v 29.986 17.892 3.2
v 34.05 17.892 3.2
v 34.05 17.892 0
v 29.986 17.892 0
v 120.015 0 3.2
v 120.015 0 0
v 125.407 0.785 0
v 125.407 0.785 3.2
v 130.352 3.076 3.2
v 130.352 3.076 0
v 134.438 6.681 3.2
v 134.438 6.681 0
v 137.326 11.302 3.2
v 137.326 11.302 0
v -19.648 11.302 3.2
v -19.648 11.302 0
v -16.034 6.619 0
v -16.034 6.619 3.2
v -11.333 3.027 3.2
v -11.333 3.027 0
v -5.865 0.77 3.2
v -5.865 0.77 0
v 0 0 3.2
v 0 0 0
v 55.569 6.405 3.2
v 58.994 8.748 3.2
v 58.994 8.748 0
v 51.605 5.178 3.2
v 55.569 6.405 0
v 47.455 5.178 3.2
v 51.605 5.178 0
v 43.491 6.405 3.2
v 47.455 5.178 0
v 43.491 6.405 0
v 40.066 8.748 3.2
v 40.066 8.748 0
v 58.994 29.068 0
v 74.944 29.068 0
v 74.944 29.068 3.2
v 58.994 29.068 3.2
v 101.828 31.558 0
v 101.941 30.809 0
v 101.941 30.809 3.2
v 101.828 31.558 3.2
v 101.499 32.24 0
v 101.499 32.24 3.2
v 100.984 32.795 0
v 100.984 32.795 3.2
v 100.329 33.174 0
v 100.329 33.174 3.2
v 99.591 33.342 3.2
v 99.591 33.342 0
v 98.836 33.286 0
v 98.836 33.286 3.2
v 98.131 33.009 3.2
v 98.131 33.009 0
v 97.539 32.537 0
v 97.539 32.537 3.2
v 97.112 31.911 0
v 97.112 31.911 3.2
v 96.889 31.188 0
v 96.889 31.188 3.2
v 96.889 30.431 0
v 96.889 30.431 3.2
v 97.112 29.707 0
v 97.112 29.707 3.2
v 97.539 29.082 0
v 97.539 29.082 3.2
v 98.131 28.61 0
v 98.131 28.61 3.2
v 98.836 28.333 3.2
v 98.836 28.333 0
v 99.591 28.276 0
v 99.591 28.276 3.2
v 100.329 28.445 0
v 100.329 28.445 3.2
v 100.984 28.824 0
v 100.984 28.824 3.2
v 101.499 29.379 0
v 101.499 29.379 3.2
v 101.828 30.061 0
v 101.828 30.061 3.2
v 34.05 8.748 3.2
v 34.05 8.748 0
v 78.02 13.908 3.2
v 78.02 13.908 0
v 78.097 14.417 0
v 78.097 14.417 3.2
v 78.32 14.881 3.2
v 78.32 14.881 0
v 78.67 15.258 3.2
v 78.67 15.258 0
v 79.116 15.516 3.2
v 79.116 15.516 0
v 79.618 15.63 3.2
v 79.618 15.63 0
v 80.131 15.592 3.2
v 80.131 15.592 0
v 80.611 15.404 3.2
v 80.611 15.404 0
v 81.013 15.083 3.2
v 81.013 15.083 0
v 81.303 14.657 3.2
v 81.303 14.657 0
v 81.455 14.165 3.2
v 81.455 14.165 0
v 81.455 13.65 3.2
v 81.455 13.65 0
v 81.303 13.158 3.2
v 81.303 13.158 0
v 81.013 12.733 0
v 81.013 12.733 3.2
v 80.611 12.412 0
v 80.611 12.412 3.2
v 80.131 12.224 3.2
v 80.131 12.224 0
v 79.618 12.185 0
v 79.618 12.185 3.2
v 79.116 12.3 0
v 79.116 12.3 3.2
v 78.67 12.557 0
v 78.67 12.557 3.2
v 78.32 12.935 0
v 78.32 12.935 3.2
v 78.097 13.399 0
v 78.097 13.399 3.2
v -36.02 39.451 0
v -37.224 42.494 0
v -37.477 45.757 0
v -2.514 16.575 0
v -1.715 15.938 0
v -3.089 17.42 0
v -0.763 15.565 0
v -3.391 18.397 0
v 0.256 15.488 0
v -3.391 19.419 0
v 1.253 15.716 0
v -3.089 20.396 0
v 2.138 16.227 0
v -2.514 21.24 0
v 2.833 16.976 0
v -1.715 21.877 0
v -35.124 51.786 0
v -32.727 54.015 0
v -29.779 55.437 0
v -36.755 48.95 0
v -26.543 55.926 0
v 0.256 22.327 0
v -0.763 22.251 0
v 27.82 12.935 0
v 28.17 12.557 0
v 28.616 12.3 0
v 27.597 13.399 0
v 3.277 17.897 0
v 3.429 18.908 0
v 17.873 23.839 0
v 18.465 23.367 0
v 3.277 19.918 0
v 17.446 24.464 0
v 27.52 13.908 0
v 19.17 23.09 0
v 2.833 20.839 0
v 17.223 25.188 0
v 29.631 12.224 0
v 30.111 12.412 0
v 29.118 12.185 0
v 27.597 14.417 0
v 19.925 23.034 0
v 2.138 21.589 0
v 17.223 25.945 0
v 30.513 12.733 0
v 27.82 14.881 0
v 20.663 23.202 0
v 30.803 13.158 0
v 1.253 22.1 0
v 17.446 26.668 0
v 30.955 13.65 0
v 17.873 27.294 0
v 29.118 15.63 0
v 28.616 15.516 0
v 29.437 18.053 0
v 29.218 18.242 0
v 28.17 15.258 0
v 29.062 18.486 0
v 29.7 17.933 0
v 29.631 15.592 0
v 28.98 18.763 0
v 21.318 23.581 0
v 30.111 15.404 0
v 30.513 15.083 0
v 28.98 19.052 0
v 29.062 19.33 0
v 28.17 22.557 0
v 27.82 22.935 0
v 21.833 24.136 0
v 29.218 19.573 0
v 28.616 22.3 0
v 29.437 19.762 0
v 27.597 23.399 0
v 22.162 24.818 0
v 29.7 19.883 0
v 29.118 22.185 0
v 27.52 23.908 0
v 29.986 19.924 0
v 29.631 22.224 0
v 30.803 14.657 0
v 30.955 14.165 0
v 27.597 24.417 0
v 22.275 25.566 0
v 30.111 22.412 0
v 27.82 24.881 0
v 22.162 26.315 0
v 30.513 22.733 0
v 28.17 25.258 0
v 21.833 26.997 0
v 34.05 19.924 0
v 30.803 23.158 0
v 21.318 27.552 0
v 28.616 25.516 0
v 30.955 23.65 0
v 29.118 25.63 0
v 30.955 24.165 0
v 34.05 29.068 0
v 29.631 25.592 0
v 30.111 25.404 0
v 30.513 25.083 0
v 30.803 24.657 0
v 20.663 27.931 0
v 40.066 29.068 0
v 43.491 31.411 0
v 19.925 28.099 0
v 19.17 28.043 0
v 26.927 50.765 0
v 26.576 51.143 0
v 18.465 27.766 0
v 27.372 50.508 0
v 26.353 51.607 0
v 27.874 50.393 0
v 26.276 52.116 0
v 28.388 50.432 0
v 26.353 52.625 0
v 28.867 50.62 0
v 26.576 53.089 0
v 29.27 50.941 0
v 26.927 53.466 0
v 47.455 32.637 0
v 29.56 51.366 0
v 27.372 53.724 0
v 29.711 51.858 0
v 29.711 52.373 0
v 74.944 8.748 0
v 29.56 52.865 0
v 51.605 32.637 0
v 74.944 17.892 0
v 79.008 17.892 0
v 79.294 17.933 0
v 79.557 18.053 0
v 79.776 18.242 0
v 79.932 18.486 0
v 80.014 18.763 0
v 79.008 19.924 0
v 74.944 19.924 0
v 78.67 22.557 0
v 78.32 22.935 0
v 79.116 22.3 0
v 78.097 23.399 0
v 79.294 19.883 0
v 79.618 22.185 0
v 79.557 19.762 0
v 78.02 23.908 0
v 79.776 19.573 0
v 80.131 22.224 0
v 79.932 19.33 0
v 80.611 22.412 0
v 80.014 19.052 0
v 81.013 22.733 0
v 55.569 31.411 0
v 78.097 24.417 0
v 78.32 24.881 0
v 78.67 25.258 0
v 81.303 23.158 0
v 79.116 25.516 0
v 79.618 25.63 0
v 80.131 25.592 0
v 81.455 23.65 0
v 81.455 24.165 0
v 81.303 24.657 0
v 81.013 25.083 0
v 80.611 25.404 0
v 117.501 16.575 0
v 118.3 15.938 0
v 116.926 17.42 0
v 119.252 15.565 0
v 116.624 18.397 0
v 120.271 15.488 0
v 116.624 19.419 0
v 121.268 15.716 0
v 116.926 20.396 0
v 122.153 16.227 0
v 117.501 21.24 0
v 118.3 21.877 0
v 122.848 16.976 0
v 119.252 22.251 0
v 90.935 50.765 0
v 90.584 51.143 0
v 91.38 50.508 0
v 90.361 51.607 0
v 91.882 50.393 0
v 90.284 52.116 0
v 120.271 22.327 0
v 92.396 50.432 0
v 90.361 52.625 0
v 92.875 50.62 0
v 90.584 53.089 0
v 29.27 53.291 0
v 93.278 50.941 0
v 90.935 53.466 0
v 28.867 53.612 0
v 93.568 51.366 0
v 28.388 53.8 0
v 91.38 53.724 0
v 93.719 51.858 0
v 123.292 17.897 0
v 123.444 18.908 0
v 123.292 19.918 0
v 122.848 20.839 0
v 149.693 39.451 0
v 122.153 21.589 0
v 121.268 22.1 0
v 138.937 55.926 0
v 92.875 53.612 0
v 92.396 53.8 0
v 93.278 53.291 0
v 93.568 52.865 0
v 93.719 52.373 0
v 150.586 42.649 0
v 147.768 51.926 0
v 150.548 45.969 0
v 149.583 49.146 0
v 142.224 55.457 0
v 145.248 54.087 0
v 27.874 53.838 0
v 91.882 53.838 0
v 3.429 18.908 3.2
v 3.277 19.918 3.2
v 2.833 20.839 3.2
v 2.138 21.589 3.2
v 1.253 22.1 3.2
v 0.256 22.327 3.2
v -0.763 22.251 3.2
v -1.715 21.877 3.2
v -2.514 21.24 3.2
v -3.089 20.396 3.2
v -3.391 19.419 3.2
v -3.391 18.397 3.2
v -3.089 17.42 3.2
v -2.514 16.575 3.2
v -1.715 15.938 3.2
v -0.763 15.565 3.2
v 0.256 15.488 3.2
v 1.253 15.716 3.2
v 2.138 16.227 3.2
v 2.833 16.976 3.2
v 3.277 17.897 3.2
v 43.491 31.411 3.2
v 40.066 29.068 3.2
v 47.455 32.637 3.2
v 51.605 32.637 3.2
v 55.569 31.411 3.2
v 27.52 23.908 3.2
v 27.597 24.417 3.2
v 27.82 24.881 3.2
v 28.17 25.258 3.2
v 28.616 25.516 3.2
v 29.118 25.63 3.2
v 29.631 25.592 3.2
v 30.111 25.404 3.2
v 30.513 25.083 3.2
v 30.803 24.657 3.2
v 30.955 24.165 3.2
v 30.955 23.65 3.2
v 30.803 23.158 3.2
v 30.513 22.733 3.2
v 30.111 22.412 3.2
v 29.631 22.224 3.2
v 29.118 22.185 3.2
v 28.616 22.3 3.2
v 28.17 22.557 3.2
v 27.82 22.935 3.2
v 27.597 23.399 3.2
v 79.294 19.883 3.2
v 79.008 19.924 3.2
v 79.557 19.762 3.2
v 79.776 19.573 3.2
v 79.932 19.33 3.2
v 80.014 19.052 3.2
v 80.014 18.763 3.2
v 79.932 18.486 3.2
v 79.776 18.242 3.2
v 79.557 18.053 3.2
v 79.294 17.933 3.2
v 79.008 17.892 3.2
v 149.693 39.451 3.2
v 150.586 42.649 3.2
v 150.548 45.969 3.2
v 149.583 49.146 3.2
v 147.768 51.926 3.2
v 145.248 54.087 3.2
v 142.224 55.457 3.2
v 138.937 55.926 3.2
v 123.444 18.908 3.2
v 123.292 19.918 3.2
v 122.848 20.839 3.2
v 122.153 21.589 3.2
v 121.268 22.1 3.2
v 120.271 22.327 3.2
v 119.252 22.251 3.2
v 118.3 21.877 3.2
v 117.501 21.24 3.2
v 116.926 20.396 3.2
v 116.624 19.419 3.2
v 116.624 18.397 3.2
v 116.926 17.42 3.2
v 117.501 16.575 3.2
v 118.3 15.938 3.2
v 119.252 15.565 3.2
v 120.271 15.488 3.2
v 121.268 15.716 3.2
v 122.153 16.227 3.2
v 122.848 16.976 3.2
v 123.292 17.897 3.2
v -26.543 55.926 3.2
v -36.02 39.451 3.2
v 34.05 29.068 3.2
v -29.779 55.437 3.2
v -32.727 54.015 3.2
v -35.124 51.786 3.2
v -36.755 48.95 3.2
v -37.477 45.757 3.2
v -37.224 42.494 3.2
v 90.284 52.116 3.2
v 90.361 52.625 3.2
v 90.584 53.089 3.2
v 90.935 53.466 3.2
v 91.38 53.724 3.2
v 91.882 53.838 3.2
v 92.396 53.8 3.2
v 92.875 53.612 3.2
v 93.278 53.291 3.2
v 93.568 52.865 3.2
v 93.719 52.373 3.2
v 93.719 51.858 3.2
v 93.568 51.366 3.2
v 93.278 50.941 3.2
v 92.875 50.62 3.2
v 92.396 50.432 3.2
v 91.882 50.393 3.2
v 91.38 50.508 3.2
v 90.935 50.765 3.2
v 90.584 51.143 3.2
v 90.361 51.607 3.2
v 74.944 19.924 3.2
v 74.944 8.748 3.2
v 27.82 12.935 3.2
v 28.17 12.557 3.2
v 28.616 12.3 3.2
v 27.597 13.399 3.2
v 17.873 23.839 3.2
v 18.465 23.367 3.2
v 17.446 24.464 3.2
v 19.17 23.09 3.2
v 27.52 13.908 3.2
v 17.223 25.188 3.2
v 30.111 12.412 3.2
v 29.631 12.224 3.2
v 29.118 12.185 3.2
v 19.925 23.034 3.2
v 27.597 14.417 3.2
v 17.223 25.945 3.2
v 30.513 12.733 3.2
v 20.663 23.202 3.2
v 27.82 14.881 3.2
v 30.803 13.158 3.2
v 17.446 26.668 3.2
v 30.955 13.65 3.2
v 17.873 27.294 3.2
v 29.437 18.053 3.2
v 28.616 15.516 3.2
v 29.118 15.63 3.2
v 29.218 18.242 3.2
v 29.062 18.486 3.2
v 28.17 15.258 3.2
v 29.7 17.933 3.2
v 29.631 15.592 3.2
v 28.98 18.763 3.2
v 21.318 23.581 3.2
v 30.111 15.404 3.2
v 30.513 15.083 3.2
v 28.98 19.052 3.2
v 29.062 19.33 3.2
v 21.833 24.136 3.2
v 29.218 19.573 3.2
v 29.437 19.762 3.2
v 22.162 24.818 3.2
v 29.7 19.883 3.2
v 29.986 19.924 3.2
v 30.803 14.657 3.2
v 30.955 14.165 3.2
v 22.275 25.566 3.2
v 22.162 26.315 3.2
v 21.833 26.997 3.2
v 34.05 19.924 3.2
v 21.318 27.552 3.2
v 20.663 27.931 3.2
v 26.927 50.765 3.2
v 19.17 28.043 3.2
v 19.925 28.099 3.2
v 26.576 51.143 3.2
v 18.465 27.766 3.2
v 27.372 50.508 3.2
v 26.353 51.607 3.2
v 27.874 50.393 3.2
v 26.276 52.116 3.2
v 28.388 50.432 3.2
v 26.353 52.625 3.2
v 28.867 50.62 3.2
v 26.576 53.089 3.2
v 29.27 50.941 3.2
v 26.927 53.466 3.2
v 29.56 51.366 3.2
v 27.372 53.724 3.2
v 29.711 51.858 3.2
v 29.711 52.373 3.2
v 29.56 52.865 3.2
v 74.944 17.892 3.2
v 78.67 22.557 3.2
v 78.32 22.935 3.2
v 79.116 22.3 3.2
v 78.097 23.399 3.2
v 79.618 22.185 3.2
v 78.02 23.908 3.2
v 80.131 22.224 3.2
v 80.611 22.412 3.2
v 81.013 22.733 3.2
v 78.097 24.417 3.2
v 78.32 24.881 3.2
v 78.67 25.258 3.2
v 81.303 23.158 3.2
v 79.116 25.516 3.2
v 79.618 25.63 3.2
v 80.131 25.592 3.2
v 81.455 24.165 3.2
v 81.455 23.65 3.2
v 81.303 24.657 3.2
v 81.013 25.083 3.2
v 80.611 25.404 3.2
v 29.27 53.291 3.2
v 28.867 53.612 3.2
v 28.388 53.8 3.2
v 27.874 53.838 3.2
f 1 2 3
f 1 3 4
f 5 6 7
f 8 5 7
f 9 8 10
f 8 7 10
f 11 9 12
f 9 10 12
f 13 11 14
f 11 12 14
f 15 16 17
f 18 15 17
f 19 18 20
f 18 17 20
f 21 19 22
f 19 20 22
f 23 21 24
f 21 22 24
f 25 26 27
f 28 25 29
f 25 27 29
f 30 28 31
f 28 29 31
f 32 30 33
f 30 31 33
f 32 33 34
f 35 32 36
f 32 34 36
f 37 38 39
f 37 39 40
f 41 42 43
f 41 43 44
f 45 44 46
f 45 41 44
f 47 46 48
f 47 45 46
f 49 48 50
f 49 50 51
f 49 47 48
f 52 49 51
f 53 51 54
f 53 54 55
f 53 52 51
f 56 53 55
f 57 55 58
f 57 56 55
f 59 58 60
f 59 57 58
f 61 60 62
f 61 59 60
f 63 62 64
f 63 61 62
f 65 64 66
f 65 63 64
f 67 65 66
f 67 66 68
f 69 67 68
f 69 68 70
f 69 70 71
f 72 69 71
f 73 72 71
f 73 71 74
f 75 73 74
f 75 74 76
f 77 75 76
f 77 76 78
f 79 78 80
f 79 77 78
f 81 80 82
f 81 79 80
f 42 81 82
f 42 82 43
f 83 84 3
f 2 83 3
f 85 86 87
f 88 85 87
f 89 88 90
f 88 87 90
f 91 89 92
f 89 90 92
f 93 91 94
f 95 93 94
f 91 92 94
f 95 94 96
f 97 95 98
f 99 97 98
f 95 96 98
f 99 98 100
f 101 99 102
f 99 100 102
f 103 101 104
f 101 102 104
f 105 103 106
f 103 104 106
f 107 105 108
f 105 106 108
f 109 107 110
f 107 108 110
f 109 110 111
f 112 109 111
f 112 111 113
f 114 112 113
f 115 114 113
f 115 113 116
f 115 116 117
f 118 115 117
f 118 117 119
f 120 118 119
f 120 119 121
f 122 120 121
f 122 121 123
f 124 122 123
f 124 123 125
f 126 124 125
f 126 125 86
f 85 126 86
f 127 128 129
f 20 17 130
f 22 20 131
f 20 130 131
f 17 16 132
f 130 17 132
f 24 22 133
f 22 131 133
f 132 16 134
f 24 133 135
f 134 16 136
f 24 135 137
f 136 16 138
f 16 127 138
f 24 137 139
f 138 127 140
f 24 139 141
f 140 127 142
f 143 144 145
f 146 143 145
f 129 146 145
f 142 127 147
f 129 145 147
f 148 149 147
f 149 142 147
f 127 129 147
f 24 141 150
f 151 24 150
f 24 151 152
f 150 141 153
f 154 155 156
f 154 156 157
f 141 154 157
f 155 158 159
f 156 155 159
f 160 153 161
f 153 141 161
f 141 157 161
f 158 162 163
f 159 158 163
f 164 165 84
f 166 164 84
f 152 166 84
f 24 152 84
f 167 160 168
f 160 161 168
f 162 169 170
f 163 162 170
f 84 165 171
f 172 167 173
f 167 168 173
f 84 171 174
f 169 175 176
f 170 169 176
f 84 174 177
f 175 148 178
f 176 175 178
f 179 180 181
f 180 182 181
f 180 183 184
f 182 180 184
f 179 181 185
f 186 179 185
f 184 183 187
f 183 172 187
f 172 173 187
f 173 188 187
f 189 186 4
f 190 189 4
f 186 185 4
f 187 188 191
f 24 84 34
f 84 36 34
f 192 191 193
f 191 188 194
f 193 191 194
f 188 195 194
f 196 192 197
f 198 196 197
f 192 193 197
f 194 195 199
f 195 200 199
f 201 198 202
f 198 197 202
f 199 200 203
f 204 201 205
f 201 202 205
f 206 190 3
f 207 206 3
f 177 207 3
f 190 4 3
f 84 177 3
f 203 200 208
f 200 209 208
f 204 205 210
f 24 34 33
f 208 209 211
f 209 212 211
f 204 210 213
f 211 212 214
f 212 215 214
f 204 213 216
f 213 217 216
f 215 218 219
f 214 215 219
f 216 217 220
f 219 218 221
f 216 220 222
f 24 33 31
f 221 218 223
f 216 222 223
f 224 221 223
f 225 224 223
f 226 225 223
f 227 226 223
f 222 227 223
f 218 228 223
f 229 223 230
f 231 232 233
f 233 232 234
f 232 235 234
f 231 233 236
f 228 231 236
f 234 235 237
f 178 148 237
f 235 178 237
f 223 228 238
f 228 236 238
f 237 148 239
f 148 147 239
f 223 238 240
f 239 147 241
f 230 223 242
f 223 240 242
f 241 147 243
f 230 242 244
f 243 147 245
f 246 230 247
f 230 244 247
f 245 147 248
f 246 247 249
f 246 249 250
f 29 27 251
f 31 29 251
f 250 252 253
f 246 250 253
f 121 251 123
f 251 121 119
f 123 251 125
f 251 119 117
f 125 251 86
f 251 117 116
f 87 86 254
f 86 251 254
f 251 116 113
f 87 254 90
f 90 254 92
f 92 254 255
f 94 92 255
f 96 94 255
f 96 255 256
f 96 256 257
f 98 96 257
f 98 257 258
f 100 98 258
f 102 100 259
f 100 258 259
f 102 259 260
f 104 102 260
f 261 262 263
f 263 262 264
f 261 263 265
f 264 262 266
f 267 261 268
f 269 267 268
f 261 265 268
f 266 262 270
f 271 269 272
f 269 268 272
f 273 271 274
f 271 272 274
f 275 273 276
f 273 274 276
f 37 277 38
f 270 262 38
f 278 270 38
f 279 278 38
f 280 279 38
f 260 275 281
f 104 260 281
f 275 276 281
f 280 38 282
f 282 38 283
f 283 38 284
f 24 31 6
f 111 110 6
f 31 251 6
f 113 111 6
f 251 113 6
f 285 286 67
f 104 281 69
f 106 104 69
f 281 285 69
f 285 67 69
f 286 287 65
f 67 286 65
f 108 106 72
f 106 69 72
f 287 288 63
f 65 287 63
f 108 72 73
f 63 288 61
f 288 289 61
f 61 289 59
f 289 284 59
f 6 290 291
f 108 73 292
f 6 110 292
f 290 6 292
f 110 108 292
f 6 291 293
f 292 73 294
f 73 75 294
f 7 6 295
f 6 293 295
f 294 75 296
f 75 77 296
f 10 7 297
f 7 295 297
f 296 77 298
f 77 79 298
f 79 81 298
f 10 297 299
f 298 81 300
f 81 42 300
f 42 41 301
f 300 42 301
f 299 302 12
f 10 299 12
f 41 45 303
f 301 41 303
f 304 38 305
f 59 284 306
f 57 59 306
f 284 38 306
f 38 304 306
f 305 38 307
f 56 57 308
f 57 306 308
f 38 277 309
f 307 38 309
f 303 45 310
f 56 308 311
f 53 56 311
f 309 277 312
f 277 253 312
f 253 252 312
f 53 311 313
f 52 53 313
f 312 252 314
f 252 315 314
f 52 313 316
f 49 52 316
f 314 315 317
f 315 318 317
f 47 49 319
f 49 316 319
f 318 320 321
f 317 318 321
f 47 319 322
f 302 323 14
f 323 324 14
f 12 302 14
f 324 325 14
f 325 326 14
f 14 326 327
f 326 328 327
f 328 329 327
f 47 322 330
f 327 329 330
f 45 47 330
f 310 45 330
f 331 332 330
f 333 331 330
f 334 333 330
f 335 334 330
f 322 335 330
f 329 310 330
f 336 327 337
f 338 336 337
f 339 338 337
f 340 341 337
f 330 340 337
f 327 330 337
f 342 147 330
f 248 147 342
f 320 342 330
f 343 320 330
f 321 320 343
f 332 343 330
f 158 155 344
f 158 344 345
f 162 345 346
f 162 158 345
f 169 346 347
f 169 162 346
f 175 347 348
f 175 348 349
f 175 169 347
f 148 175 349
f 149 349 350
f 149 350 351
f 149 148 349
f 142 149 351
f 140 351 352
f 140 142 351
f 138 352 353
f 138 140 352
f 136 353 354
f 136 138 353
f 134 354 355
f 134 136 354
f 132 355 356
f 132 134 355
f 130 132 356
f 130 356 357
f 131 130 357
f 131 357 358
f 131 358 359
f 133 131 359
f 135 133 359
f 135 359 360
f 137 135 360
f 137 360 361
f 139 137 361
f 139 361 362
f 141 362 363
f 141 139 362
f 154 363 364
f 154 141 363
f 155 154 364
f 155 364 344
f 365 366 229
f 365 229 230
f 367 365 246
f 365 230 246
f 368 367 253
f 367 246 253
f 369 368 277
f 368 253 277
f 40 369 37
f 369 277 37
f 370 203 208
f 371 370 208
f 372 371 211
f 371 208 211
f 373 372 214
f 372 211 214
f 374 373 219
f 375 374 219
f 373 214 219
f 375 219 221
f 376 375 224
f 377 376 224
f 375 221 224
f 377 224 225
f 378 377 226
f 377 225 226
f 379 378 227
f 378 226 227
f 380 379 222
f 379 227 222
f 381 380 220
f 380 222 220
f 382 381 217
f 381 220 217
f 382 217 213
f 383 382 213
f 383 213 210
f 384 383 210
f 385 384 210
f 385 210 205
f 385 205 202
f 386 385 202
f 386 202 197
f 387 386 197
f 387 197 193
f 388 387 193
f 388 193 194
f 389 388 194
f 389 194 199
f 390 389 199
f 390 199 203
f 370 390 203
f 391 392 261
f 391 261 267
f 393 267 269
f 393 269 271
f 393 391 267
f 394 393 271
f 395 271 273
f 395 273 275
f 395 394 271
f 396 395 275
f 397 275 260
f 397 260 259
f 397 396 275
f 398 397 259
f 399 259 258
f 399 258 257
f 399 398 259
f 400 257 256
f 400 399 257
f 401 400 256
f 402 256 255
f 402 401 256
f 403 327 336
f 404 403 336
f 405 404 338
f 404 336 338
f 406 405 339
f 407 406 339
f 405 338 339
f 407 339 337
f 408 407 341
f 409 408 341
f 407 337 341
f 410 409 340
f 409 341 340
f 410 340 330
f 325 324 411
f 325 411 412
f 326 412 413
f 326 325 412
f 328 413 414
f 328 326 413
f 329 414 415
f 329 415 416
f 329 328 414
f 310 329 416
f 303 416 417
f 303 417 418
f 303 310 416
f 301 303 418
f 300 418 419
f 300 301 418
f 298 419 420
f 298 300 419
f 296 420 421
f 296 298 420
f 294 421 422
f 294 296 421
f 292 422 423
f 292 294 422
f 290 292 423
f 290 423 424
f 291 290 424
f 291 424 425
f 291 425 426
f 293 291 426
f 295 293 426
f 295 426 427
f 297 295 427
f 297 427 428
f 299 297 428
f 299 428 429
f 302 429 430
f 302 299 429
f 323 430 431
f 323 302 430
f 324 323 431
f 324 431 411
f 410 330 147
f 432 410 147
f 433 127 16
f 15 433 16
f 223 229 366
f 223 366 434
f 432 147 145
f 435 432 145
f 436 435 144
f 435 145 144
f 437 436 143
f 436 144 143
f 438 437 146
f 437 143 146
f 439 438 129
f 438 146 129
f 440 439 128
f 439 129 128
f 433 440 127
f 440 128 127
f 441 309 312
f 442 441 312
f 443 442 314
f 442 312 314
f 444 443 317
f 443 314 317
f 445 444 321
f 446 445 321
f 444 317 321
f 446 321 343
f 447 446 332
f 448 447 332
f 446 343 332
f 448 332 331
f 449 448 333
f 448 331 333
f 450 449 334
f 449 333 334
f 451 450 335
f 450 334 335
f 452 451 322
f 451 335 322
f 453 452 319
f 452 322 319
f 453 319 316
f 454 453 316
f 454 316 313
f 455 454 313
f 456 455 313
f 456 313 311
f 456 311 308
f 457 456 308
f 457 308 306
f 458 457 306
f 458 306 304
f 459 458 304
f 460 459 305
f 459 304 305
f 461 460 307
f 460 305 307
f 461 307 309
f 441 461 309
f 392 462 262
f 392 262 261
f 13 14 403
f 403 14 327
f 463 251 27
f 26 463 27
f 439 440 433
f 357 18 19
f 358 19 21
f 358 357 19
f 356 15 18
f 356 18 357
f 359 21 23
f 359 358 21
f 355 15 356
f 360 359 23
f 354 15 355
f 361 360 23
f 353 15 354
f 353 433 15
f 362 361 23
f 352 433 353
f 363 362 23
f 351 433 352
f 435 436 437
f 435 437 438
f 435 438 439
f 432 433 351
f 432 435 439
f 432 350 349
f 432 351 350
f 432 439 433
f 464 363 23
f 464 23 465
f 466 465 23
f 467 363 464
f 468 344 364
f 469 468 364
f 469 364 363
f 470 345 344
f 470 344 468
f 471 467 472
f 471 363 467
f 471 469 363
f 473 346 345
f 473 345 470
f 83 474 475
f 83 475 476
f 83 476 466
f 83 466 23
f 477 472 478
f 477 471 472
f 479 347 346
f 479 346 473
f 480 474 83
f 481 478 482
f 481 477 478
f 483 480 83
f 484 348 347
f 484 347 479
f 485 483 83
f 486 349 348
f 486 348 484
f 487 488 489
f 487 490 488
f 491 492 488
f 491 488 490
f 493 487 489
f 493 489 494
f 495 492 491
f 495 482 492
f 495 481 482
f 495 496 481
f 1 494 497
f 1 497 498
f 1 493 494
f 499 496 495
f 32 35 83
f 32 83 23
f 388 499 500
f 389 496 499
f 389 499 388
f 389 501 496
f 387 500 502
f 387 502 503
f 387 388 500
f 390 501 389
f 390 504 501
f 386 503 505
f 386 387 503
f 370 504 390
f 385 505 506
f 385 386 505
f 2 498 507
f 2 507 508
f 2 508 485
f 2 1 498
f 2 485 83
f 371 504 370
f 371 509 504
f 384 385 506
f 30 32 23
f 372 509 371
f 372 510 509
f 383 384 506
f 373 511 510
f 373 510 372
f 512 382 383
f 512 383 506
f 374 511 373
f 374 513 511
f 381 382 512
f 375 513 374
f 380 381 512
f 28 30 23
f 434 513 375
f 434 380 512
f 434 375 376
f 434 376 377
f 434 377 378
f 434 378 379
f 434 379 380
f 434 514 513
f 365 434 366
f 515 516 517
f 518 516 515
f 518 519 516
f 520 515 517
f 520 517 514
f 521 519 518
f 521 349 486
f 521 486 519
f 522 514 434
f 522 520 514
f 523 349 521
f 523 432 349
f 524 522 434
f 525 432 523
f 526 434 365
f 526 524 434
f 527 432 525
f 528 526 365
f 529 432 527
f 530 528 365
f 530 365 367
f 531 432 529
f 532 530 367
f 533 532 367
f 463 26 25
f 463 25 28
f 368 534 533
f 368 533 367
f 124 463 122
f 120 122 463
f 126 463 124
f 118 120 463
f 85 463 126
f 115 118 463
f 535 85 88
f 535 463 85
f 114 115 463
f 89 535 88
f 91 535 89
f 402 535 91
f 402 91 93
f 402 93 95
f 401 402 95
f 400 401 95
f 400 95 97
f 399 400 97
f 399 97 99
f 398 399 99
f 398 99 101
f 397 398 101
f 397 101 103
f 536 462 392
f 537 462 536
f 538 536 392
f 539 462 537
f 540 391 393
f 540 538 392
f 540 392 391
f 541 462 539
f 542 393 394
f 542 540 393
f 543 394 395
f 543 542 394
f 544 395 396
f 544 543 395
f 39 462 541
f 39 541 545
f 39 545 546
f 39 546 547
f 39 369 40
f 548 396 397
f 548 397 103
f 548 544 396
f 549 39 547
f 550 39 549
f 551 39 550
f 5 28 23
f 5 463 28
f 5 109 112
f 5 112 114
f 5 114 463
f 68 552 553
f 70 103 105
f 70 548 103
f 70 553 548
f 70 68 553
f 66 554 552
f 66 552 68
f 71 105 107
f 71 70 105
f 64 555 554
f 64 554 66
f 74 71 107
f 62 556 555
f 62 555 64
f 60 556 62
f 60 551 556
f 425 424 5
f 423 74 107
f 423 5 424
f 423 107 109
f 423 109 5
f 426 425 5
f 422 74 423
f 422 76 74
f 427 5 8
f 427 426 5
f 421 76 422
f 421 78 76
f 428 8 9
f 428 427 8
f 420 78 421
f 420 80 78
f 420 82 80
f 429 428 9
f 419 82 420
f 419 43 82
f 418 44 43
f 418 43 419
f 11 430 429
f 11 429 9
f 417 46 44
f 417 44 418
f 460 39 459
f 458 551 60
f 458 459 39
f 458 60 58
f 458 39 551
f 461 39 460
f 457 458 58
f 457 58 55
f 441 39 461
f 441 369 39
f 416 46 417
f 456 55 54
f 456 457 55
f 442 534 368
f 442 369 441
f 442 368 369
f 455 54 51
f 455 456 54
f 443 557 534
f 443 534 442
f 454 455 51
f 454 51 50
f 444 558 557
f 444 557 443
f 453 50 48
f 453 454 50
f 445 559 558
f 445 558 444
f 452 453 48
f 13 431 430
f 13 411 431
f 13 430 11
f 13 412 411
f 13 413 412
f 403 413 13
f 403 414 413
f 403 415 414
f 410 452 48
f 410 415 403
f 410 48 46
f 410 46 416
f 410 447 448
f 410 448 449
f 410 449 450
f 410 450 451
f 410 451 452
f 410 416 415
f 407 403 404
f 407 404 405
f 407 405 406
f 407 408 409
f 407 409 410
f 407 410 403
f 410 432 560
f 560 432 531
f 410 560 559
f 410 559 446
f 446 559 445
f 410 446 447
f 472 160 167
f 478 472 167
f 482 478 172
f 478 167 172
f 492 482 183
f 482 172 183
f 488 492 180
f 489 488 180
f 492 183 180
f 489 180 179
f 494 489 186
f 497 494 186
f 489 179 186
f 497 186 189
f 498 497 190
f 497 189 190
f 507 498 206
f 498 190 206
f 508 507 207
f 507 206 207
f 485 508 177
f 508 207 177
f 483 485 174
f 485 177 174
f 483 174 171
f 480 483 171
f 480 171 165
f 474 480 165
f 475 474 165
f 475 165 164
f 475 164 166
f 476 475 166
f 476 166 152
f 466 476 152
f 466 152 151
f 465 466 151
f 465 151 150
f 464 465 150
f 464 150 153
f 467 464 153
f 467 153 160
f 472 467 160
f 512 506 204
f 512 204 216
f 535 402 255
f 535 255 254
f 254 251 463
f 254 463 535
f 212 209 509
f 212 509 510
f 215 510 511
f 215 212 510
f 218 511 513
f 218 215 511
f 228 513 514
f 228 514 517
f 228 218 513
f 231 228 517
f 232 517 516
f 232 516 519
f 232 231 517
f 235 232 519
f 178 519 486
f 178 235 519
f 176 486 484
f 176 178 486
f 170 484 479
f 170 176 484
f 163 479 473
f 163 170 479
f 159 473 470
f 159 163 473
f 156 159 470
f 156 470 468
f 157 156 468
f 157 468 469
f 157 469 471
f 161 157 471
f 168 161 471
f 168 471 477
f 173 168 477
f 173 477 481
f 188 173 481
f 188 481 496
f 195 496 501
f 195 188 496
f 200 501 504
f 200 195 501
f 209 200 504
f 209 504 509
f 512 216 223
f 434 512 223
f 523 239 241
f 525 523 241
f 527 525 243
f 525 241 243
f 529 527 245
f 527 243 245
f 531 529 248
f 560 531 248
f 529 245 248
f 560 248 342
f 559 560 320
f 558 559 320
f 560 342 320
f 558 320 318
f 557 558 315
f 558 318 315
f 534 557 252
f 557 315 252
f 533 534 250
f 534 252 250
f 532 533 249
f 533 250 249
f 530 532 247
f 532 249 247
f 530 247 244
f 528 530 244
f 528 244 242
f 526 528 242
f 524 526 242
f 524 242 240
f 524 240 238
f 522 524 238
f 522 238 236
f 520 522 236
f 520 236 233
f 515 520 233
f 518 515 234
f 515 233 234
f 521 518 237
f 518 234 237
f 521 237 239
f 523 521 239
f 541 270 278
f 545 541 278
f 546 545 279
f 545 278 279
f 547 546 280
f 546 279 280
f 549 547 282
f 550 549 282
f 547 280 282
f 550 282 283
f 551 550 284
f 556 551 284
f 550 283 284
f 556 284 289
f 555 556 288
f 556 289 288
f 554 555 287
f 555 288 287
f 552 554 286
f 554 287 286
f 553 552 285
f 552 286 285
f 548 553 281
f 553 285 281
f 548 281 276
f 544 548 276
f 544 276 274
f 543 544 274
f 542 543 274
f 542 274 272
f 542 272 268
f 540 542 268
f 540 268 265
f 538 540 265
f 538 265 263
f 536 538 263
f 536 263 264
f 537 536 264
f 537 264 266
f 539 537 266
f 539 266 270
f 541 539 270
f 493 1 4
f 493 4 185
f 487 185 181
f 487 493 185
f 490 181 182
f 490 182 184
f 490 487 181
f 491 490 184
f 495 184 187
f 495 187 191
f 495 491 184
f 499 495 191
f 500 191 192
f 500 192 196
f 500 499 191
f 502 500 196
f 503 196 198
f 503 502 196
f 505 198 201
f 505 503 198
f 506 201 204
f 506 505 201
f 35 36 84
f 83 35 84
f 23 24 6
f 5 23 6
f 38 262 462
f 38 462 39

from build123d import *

# Parameters (mm, degrees)
SKETCH1_R           = 3.429
SKETCH1_R_2         = 2.54
BOSS_EXTRUDE1_DEPTH = 3.2004
SKETCH2_R           = 1.7272
CUT_EXTRUDE1_DEPTH  = 3.2004
SKETCH5_R           = 1.7272
SKETCH5_W           = 40.894
SKETCH5_H           = 20.32
CUT_EXTRUDE3_DEPTH  = 4.2004
CUT_EXTRUDE4_DEPTH  = 3.2004
SKETCH9_R           = 13.885201093
CUT_EXTRUDE7_DEPTH  = 3.2004


with BuildPart() as part:
    # Sketch1 → Boss-Extrude1 (new body)
    with BuildSketch(Plane.XY):
        with BuildLine():
            Line((0, 0), (120.015, 0))
            ThreePointArc((120.015, 0), (130.351788397, 3.075697789), (137.325636158, 11.302152593))
            Line((137.325636158, 11.302152593), (149.69326877, 39.451329485))
            ThreePointArc((149.69326877, 39.451329485), (148.774539583, 50.600046625), (138.937102863, 55.925719911))
            Line((138.937102863, 55.925719911), (-26.54325766, 55.925719911))
            ThreePointArc((-26.54325766, 55.925719911), (-36.046025914, 50.429200208), (-36.019801229, 39.451329485))
            Line((-36.019801229, 39.451329485), (-19.648099871, 11.302152593))
            ThreePointArc((-19.648099871, 11.302152593), (-11.333429333, 3.027112684), (0, 0))
        make_face()
        with Locations((120.015, 18.90776)):
            Circle(SKETCH1_R, mode=Mode.SUBTRACT)
        with Locations((0, 18.90776)):
            Circle(SKETCH1_R, mode=Mode.SUBTRACT)
        with Locations((19.734727626, 25.566426992)):
            Circle(SKETCH1_R_2, mode=Mode.SUBTRACT)
        with Locations((99.400822531, 30.809360911)):
            Circle(SKETCH1_R_2, mode=Mode.SUBTRACT)
    extrude(amount=BOSS_EXTRUDE1_DEPTH)

    # Sketch2 → Cut-Extrude1 (cut)
    with BuildSketch(Plane(origin=(0, 0, 0), x_dir=(-1, 0, 0), z_dir=(0, 0, -1))):
        with Locations((-92.0115, 52.115719911)):
            Circle(SKETCH2_R)
        with Locations((-28.0035, 52.115719911)):
            Circle(SKETCH2_R)
    extrude(amount=-CUT_EXTRUDE1_DEPTH, mode=Mode.SUBTRACT)

    # Sketch5 → Cut-Extrude3 (cut, through all)
    with BuildSketch(Plane(origin=(0, 0, 0), x_dir=(-1, 0, 0), z_dir=(0, 0, -1))):
        with Locations((-79.746999972, 23.90776)):
            Circle(SKETCH5_R)
        with Locations((-29.246999972, 13.90776)):
            Circle(SKETCH5_R)
        with Locations((-29.246999972, 23.90776)):
            Circle(SKETCH5_R)
        with Locations((-79.746999972, 13.90776)):
            Circle(SKETCH5_R)
        with Locations((-54.496999972, 18.90776)):
            Rectangle(SKETCH5_W, SKETCH5_H)
    extrude(amount=-CUT_EXTRUDE3_DEPTH, mode=Mode.SUBTRACT)

    # Sketch6 → Cut-Extrude4 (cut)
    with BuildSketch(Plane.XY.offset(3.2004)):
        with BuildLine():
            Line((29.985999972, 19.92376), (34.049999972, 19.92376))
            Line((34.049999972, 19.92376), (34.049999972, 17.89176))
            Line((34.049999972, 17.89176), (29.985999972, 17.89176))
            ThreePointArc((29.985999972, 17.89176), (28.969999972, 18.90776), (29.985999972, 19.92376))
        make_face()
        with BuildLine():
            Line((74.943999972, 19.92376), (79.007999972, 19.92376))
            ThreePointArc((79.007999972, 19.92376), (80.023999972, 18.90776), (79.007999972, 17.89176))
            Line((79.007999972, 17.89176), (74.943999972, 17.89176))
            Line((74.943999972, 17.89176), (74.943999972, 19.92376))
        make_face()
    extrude(amount=-CUT_EXTRUDE4_DEPTH, mode=Mode.SUBTRACT)

    # Sketch9 → Cut-Extrude7 (cut)
    with BuildSketch(Plane(origin=(0, 0, 0), x_dir=(-1, 0, 0), z_dir=(0, 0, -1))):
        with Locations((-49.53, 18.90776)):
            Circle(SKETCH9_R)
    extrude(amount=-CUT_EXTRUDE7_DEPTH, mode=Mode.SUBTRACT)


solid = part.part
